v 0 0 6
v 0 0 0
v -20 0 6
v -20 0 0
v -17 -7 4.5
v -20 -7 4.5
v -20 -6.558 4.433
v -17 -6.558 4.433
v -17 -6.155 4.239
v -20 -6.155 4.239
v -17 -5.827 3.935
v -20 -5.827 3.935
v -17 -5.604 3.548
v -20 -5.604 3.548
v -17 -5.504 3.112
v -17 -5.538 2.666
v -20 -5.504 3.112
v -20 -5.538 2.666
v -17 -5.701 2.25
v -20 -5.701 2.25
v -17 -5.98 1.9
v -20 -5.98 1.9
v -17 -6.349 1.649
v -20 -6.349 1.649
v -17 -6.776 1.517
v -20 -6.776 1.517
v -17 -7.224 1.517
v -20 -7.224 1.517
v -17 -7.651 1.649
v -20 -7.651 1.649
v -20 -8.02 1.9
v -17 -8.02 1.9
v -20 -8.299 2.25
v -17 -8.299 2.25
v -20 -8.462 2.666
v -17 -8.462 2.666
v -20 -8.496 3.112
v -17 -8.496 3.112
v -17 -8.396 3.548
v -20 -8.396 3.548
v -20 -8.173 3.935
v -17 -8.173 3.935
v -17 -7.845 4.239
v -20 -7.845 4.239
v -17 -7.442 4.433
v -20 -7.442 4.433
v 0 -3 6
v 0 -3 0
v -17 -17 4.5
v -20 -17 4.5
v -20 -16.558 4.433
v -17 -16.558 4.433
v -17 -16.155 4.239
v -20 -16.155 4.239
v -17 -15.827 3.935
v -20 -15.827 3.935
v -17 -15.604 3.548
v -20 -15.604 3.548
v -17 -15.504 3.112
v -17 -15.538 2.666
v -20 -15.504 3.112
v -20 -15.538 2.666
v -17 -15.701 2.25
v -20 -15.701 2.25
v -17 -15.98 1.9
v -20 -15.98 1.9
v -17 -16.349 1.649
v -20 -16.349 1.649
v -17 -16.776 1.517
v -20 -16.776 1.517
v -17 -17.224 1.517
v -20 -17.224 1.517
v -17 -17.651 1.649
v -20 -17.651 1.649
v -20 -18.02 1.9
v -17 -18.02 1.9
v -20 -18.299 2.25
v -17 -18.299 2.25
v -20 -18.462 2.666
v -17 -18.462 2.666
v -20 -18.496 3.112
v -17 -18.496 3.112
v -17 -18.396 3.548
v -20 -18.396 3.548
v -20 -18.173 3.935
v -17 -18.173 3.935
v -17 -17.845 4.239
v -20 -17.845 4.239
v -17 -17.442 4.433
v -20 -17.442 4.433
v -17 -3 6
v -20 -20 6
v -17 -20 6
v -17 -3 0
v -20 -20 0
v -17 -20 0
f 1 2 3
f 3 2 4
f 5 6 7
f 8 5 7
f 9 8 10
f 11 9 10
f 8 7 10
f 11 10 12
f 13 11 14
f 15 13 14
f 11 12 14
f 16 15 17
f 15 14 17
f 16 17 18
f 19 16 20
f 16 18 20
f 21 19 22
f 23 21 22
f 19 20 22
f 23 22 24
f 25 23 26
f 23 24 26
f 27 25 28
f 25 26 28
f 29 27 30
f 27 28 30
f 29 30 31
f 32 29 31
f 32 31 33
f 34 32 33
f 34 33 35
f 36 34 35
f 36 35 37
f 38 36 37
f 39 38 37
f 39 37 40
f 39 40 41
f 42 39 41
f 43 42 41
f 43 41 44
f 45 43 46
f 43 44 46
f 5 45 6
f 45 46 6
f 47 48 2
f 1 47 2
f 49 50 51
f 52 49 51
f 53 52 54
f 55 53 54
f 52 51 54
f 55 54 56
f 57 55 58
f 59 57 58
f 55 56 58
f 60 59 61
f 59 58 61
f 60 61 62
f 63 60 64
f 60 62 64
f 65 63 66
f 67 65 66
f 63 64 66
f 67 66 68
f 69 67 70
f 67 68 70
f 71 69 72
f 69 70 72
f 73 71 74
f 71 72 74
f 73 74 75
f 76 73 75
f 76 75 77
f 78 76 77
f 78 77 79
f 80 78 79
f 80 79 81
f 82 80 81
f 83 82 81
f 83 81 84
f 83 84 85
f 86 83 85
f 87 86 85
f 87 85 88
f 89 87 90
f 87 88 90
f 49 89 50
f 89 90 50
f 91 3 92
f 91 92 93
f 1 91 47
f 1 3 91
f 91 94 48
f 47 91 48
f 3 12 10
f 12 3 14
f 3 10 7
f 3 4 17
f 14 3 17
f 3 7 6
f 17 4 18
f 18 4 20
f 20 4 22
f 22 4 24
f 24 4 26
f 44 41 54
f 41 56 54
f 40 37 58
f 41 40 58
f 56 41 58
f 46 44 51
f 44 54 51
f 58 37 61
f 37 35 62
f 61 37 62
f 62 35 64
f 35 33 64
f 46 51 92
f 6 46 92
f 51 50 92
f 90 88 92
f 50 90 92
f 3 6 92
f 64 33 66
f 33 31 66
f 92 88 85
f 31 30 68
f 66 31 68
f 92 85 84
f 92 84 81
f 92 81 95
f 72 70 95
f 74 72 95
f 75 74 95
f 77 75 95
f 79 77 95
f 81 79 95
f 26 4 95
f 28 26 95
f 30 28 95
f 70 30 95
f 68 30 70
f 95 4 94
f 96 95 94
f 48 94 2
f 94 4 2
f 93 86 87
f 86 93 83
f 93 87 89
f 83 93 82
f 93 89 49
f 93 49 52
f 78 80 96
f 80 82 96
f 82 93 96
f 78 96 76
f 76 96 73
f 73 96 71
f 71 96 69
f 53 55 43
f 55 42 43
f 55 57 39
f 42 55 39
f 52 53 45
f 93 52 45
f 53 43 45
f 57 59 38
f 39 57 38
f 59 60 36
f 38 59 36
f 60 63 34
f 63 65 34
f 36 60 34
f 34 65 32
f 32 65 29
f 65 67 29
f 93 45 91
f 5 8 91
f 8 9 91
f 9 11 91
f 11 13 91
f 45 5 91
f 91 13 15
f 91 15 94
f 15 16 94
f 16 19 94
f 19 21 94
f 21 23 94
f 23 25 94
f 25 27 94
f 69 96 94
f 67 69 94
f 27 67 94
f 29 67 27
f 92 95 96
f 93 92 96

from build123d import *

# Parameters (mm, degrees)
BOSS_EXTRUDE1_DEPTH = 6
SKETCH4_R           = 1.5
CUT_EXTRUDE1_DEPTH  = 3


with BuildPart() as part:
    # Sketch1 → Boss-Extrude1 (new body)
    with BuildSketch(Plane.XY):
        Polygon((0, 0), (-20, 0), (-20, -20), (-17, -20), (-17, -3), (0, -3), align=None)
    extrude(amount=BOSS_EXTRUDE1_DEPTH)

    # Sketch4 → Cut-Extrude1 (cut)
    with BuildSketch(Plane.ZY.offset(20)):
        with Locations((3, -7)):
            Circle(SKETCH4_R)
        with Locations((3, -17)):
            Circle(SKETCH4_R)
    extrude(amount=-CUT_EXTRUDE1_DEPTH, mode=Mode.SUBTRACT)


solid = part.part
